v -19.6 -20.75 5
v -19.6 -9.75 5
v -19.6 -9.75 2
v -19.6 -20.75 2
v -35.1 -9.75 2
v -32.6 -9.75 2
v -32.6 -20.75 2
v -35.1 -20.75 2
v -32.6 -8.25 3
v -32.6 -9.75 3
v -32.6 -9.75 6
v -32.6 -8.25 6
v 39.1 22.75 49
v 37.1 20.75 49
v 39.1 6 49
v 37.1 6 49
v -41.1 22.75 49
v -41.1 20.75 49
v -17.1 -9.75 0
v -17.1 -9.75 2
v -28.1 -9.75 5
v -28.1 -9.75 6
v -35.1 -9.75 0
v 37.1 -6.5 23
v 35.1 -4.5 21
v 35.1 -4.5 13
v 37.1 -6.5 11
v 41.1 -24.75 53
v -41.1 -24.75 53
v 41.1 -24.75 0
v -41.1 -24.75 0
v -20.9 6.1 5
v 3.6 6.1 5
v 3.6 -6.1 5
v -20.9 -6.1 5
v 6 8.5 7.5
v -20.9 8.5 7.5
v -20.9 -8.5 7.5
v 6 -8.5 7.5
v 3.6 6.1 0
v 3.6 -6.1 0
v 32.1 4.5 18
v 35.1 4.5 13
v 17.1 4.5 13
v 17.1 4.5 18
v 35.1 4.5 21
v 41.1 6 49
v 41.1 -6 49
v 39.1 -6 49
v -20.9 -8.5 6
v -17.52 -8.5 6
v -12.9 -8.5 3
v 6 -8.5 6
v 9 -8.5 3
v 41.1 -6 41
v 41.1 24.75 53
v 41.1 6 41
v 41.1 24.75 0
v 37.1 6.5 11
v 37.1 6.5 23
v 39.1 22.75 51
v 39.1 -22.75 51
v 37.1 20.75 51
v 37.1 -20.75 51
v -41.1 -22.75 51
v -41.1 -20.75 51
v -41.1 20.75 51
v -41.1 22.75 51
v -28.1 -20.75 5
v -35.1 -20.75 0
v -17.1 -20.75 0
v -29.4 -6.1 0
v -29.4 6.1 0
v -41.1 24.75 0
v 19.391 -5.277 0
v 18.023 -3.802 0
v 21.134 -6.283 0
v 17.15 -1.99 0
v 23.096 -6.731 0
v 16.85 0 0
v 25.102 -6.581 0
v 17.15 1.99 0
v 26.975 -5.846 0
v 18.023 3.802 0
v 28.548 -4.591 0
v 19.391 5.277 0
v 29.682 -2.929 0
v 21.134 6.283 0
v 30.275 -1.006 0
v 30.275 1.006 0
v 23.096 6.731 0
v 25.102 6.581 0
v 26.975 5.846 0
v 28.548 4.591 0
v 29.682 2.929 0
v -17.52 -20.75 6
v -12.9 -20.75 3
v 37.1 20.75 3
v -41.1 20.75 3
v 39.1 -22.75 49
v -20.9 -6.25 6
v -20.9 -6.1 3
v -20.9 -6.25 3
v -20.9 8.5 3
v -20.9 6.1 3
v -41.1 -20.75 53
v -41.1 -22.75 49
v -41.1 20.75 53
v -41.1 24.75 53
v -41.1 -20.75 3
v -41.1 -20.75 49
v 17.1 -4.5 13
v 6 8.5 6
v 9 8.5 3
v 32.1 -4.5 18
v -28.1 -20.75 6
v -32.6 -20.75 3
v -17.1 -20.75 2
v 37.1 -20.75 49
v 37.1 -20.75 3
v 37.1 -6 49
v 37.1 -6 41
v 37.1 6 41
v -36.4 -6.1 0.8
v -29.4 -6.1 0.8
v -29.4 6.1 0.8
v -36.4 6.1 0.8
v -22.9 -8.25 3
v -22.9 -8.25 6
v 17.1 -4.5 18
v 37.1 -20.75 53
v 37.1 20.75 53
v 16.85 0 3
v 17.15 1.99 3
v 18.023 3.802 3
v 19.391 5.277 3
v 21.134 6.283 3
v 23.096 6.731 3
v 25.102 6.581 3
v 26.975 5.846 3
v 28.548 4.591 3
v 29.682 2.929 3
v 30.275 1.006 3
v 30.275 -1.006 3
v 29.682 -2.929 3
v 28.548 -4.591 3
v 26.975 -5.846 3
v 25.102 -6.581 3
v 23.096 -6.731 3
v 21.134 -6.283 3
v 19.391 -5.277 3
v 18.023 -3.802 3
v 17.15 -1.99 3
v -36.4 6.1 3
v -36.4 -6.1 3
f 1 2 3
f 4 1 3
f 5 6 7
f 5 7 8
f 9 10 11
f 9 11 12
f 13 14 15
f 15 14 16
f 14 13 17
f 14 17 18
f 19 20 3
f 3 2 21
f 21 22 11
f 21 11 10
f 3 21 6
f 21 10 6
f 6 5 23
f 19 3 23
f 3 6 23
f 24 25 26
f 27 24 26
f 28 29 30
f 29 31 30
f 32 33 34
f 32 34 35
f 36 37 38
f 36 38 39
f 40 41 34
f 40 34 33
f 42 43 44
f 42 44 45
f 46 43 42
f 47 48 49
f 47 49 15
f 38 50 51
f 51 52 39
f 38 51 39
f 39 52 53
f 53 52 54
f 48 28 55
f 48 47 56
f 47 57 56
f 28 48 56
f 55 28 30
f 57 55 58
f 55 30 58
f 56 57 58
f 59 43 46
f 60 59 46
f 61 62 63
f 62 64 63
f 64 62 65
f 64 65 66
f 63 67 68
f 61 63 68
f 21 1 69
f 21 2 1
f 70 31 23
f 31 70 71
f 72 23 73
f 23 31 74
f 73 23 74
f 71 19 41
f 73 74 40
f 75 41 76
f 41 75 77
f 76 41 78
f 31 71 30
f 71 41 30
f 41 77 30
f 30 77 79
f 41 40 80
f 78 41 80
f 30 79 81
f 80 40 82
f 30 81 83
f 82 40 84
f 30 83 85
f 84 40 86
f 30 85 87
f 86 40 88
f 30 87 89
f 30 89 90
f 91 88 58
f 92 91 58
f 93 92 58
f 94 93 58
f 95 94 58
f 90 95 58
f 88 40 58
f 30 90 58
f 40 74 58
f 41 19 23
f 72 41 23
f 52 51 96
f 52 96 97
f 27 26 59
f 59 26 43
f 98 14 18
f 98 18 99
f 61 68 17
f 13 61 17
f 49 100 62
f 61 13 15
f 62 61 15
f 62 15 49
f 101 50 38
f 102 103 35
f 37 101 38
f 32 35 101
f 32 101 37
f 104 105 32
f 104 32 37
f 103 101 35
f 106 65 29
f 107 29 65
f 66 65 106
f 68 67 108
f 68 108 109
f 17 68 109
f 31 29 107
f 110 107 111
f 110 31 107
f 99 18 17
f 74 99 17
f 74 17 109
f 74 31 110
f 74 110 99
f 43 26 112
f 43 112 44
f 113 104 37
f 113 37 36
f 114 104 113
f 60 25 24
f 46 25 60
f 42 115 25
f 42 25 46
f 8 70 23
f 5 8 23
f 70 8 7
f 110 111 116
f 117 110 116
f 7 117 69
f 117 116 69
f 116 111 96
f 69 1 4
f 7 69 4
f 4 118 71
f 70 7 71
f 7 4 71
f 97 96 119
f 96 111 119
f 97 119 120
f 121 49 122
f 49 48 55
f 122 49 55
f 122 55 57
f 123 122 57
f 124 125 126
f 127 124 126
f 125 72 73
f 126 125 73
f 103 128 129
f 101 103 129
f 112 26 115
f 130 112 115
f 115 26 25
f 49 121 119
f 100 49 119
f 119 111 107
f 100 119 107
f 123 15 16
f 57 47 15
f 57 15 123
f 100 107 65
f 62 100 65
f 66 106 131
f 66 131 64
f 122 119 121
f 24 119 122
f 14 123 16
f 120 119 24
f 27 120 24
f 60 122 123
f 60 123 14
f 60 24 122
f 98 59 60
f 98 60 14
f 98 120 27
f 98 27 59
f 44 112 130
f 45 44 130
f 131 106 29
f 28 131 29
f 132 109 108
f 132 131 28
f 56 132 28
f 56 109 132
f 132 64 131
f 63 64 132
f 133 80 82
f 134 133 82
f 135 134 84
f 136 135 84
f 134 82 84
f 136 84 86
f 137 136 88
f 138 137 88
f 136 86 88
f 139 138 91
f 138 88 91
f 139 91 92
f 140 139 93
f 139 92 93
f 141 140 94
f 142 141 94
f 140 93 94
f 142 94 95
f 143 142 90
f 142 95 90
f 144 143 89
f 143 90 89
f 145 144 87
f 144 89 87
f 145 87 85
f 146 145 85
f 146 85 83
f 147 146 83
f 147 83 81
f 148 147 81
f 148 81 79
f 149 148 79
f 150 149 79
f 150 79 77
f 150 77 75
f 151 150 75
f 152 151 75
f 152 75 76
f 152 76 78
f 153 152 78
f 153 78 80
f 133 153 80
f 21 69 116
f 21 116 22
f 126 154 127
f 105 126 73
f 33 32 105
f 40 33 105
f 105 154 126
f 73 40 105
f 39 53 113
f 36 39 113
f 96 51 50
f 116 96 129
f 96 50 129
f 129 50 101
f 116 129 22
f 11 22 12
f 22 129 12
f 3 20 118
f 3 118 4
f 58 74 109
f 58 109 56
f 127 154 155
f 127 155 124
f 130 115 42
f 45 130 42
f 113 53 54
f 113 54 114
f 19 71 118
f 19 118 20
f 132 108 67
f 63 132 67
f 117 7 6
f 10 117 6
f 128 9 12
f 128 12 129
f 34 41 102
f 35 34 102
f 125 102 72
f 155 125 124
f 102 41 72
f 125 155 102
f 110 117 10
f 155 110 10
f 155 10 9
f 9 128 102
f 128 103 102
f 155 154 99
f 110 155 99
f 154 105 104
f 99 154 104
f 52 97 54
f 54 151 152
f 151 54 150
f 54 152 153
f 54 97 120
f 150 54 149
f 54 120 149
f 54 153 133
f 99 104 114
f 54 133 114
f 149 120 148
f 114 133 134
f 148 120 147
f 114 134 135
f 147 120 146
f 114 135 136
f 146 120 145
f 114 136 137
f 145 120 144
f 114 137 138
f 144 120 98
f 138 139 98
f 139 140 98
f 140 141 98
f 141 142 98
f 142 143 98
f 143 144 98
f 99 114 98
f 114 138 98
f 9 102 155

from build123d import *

# Parameters (mm, degrees)
ESQUISSE1_W              = 82.2
ESQUISSE1_H              = 49.5
BOSS_EXTRU_1_DEPTH       = 3
ESQUISSE2_W              = 82.2
ESQUISSE2_H              = 49.5
ESQUISSE2_W_2            = 74.2
ESQUISSE2_H_2            = 41.5
BOSS_EXTRU_2_DEPTH       = 50
ESQUISSE4_W              = 2
ESQUISSE4_H              = 41.5
ENL_V_MAT_EXTRU_3_DEPTH  = 16
ENL_V_MAT_EXTRU_4_DEPTH  = 80.2
ESQUISSE6_W              = 46
ESQUISSE6_H              = 41.5
ENL_V_MAT_EXTRU_5_DEPTH  = 10
ESQUISSE7_W              = 5
ESQUISSE7_H              = 9
BOSS_EXTRU_3_DEPTH       = 20
CHANFREIN1_SIZE          = 5
CHANFREIN2_SIZE          = 2
CHANFREIN3_SIZE          = 2
ESQUISSE8_R              = 6.75
ENL_V_MAT_EXTRU_6_DEPTH  = 5
ESQUISSE10_W             = 26.9
ESQUISSE10_H             = 17
BOSS_EXTRU_4_DEPTH       = 4.5
ESQUISSE9_W              = 33
ESQUISSE9_H              = 12.2
ENL_V_MAT_EXTRU_8_DEPTH  = 5
ESQUISSE11_W             = 2.2
ESQUISSE11_H             = 12.2
ENL_V_MAT_EXTRU_9_DEPTH  = 7
ESQUISSE12_W             = 18
ESQUISSE12_H             = 11
ENL_V_MAT_EXTRU_10_DEPTH = 2
ESQUISSE13_W             = 4.5
ESQUISSE13_H             = 11
ENL_V_MAT_EXTRU_11_DEPTH = 3
ESQUISSE14_W             = 4
ESQUISSE14_H             = 11
BOSS_EXTRU_5_DEPTH       = 3
ESQUISSE15_W             = 4
ESQUISSE15_H             = 11
ENL_V_MAT_EXTRU_12_DEPTH = 3
ESQUISSE16_W             = 7
ESQUISSE16_H             = 1.5
BOSS_EXTRU_6_DEPTH       = 3
CHANFREIN4_SIZE          = 3
ESQUISSE18_W             = 0.2
ESQUISSE18_H             = 1.5
ESQUISSE18_W_2           = 4.5
BOSS_EXTRU_8_DEPTH       = 3
ESQUISSE19_W             = 3
ESQUISSE19_H             = 1.25
BOSS_EXTRU_9_DEPTH       = 3
ESQUISSE20_W             = 1.7
ESQUISSE20_H             = 2
BOSS_EXTRU_10_DEPTH      = 11
CHANFREIN10_SIZE         = 3.247037966
CHANFREIN10_SIZE_2       = 5
CHANFREIN11_SIZE         = 2
ESQUISSE21_W             = 8
ESQUISSE21_H             = 12
ENL_V_MAT_EXTRU_13_DEPTH = 10


with BuildPart() as part:
    # Esquisse1 → Boss.-Extru.1 (new body)
    with BuildSketch(Plane.XY):
        Rectangle(ESQUISSE1_W, ESQUISSE1_H)
    extrude(amount=BOSS_EXTRU_1_DEPTH)

    # Esquisse2 → Boss.-Extru.2 (add)
    with BuildSketch(Plane.XY.offset(3)):
        Rectangle(ESQUISSE2_W, ESQUISSE2_H)
        Rectangle(ESQUISSE2_W_2, ESQUISSE2_H_2, mode=Mode.SUBTRACT)
    extrude(amount=BOSS_EXTRU_2_DEPTH)

    # Esquisse4 → Enlèv. mat.-Extru.3 (cut)
    with BuildSketch(Plane(origin=(-37.1, 0, 0), x_dir=(0, 0, -1), z_dir=(1, 0, 0))):
        with Locations((-52, 0)):
            Rectangle(ESQUISSE4_W, ESQUISSE4_H)
    extrude(amount=-ENL_V_MAT_EXTRU_3_DEPTH, mode=Mode.SUBTRACT)

    # Esquisse5 → Enlèv. mat.-Extru.4 (cut)
    with BuildSketch(Plane.ZY.offset(41.1)):
        Polygon((51, 22.75), (49, 22.75), (49, -22.75), (51, -22.75), (51, -20.75), (51, 20.75), align=None)
    extrude(amount=-ENL_V_MAT_EXTRU_4_DEPTH, mode=Mode.SUBTRACT)

    # Esquisse6 → Enlèv. mat.-Extru.5 (cut)
    with BuildSketch(Plane(origin=(-37.1, 0, 0), x_dir=(0, 0, -1), z_dir=(1, 0, 0))):
        with Locations((-26, 0)):
            Rectangle(ESQUISSE6_W, ESQUISSE6_H)
    extrude(amount=-ENL_V_MAT_EXTRU_5_DEPTH, mode=Mode.SUBTRACT)

    # Esquisse7 → Boss.-Extru.3 (add)
    with BuildSketch(Plane.ZY.offset(-37.1)):
        with Locations((15.5, 0)):
            Rectangle(ESQUISSE7_W, ESQUISSE7_H)
    extrude(amount=BOSS_EXTRU_3_DEPTH)

    # Chanfrein1
    chanfrein1_edges = [part.edges().sort_by_distance(p)[0] for p in [
        (37.1, 0, 18),
    ]]
    chamfer(chanfrein1_edges, length=CHANFREIN1_SIZE)

    # Chanfrein2
    chanfrein2_edges = [part.edges().sort_by_distance(p)[0] for p in [
        (37.1, 0, 13),
    ]]
    chamfer(chanfrein2_edges, length=CHANFREIN2_SIZE)

    # Chanfrein3
    chanfrein3_edges = [part.edges().sort_by_distance(p)[0] for p in [
        (37.1, -4.5, 17),
        (37.1, 4.5, 17),
    ]]
    chamfer(chanfrein3_edges, length=CHANFREIN3_SIZE)

    # Esquisse8 → Enlèv. mat.-Extru.6 (cut)
    with BuildSketch(Plane(origin=(0, 0, 0), x_dir=(-1, 0, 0), z_dir=(0, 0, -1))):
        with Locations((-23.6, 0)):
            Circle(ESQUISSE8_R)
    extrude(amount=-ENL_V_MAT_EXTRU_6_DEPTH, mode=Mode.SUBTRACT)

    # Esquisse10 → Boss.-Extru.4 (add)
    with BuildSketch(Plane.XY.offset(3)):
        with Locations((-7.45, 0)):
            Rectangle(ESQUISSE10_W, ESQUISSE10_H)
    extrude(amount=BOSS_EXTRU_4_DEPTH)

    # Esquisse9 → Enlèv. mat.-Extru.8 (cut)
    with BuildSketch(Plane(origin=(0, 0, 0), x_dir=(-1, 0, 0), z_dir=(0, 0, -1))):
        with Locations((12.9, 0)):
            Rectangle(ESQUISSE9_W, ESQUISSE9_H)
    extrude(amount=-ENL_V_MAT_EXTRU_8_DEPTH, mode=Mode.SUBTRACT)

    # Esquisse11 → Enlèv. mat.-Extru.9 (cut)
    with BuildSketch(Plane(origin=(-29.4, 0, 0), x_dir=(0, 0, -1), z_dir=(1, 0, 0))):
        with Locations((-1.9, 0)):
            Rectangle(ESQUISSE11_W, ESQUISSE11_H)
    extrude(amount=-ENL_V_MAT_EXTRU_9_DEPTH, mode=Mode.SUBTRACT)

    # Esquisse12 → Enlèv. mat.-Extru.10 (cut)
    with BuildSketch(Plane(origin=(0, 0, 0), x_dir=(-1, 0, 0), z_dir=(0, 0, -1))):
        with Locations((26.1, -15.25)):
            Rectangle(ESQUISSE12_W, ESQUISSE12_H)
    extrude(amount=-ENL_V_MAT_EXTRU_10_DEPTH, mode=Mode.SUBTRACT)

    # Esquisse13 → Enlèv. mat.-Extru.11 (cut)
    with BuildSketch(Plane(origin=(0, 0, 2), x_dir=(-1, 0, 0), z_dir=(0, 0, -1))):
        with Locations((21.85, -15.25)):
            Rectangle(ESQUISSE13_W, ESQUISSE13_H)
        with Locations((30.35, -15.25)):
            Rectangle(ESQUISSE13_W, ESQUISSE13_H)
    extrude(amount=-ENL_V_MAT_EXTRU_11_DEPTH, mode=Mode.SUBTRACT)

    # Esquisse14 → Boss.-Extru.5 (add)
    with BuildSketch(Plane.XY.offset(3)):
        with Locations((-26.1, -15.25)):
            Rectangle(ESQUISSE14_W, ESQUISSE14_H)
    extrude(amount=BOSS_EXTRU_5_DEPTH)

    # Esquisse15 → Enlèv. mat.-Extru.12 (cut)
    with BuildSketch(Plane(origin=(0, 0, 2), x_dir=(-1, 0, 0), z_dir=(0, 0, -1))):
        with Locations((26.1, -15.25)):
            Rectangle(ESQUISSE15_W, ESQUISSE15_H)
    extrude(amount=-ENL_V_MAT_EXTRU_12_DEPTH, mode=Mode.SUBTRACT)

    # Esquisse16 → Boss.-Extru.6 (add)
    with BuildSketch(Plane.XY.offset(3)):
        with Locations((-24.6, -9)):
            Rectangle(ESQUISSE16_W, ESQUISSE16_H)
    extrude(amount=BOSS_EXTRU_6_DEPTH)

    # Chanfrein4
    chanfrein4_edges = [part.edges().sort_by_distance(p)[0] for p in [
        (6, 0, 3),
    ]]
    chamfer(chanfrein4_edges, length=CHANFREIN4_SIZE)

    # Esquisse18 → Boss.-Extru.8 (add)
    with BuildSketch(Plane.XY.offset(3)):
        with Locations((-21, -9)):
            Rectangle(ESQUISSE18_W, ESQUISSE18_H)
        with Locations((-30.35, -9)):
            Rectangle(ESQUISSE18_W_2, ESQUISSE18_H)
    extrude(amount=BOSS_EXTRU_8_DEPTH)

    # Esquisse19 → Boss.-Extru.9 (add)
    with BuildSketch(Plane(origin=(-20.9, 0, 0), x_dir=(0, 0, -1), z_dir=(1, 0, 0))):
        with Locations((-4.5, -9.125)):
            Rectangle(ESQUISSE19_W, ESQUISSE19_H)
    extrude(amount=BOSS_EXTRU_9_DEPTH)

    # Esquisse20 → Boss.-Extru.10 (add)
    with BuildSketch(Plane(origin=(0, -9.75, 0), x_dir=(-1, 0, 0), z_dir=(0, -1, 0))):
        Polygon((17.9, -6), (24.1, -6), (24.1, -5), (19.6, -5), (17.9, -5), align=None)
        with Locations((18.75, -4)):
            Rectangle(ESQUISSE20_W, ESQUISSE20_H)
    extrude(amount=BOSS_EXTRU_10_DEPTH)

    # Chanfrein10
    # the kernel refuses this chamfer: 5, 3.247037966 mm, written as the material it adds along each edge
    with BuildSketch(Plane(origin=(-17.9, 4.422205001, 3), x_dir=(-0.04991856572298826, 0, 0.9987532912567346), z_dir=(0, -1, 0))) as chanfrein10_piece_1_section:
        Polygon((CHANFREIN10_SIZE * 0.998753291253, -CHANFREIN10_SIZE * 0.0499185657228), (-CHANFREIN10_SIZE_2 * 0.049918565723, -CHANFREIN10_SIZE_2 * 0.998753291257), (0, 0), align=None)
    chanfrein10_piece_1 = extrude(amount=25.172205001, mode=Mode.PRIVATE)
    chanfrein10_piece_1 = split(chanfrein10_piece_1, bisect_by=Plane(origin=(-17.932311405, -8.5, 6.135567439), z_dir=(0, 1, 0)), keep=Keep.TOP, mode=Mode.PRIVATE)
    chanfrein10_piece_1 = split(chanfrein10_piece_1, bisect_by=Plane(origin=(-17.932311405, -2.038897499, 6), z_dir=(0, 0, 1)), keep=Keep.TOP, mode=Mode.PRIVATE)
    add(chanfrein10_piece_1)
    with BuildSketch(Plane(origin=(-17.9, -8.5, 3), x_dir=(-0.04991856572298826, 0, 0.9987532912567346), z_dir=(0, -1, 0))) as chanfrein10_piece_2_section:
        Polygon((CHANFREIN10_SIZE * 0.998753291253, -CHANFREIN10_SIZE * 0.0499185657228), (-CHANFREIN10_SIZE_2 * 0.049918565723, -CHANFREIN10_SIZE_2 * 0.998753291257), (0, 0), align=None)
    chanfrein10_piece_2 = extrude(amount=12.25, mode=Mode.PRIVATE)
    chanfrein10_piece_2 = split(chanfrein10_piece_2, bisect_by=Plane(origin=(-16.206622299, -14.625, 6), z_dir=(0, 0, -1)), keep=Keep.TOP, mode=Mode.PRIVATE)
    add(chanfrein10_piece_2)

    # Chanfrein11
    chanfrein11_edges = [part.edges().sort_by_distance(p)[0] for p in [
        (-20.9, -8.25, 4.5),
    ]]
    chamfer(chanfrein11_edges, length=CHANFREIN11_SIZE)

    # Esquisse21 → Enlèv. mat.-Extru.13 (cut)
    with BuildSketch(Plane(origin=(41.1, 0, 0), x_dir=(0, 0, -1), z_dir=(1, 0, 0))):
        with Locations((-45, 0)):
            Rectangle(ESQUISSE21_W, ESQUISSE21_H)
    extrude(amount=-ENL_V_MAT_EXTRU_13_DEPTH, mode=Mode.SUBTRACT)


solid = part.part
